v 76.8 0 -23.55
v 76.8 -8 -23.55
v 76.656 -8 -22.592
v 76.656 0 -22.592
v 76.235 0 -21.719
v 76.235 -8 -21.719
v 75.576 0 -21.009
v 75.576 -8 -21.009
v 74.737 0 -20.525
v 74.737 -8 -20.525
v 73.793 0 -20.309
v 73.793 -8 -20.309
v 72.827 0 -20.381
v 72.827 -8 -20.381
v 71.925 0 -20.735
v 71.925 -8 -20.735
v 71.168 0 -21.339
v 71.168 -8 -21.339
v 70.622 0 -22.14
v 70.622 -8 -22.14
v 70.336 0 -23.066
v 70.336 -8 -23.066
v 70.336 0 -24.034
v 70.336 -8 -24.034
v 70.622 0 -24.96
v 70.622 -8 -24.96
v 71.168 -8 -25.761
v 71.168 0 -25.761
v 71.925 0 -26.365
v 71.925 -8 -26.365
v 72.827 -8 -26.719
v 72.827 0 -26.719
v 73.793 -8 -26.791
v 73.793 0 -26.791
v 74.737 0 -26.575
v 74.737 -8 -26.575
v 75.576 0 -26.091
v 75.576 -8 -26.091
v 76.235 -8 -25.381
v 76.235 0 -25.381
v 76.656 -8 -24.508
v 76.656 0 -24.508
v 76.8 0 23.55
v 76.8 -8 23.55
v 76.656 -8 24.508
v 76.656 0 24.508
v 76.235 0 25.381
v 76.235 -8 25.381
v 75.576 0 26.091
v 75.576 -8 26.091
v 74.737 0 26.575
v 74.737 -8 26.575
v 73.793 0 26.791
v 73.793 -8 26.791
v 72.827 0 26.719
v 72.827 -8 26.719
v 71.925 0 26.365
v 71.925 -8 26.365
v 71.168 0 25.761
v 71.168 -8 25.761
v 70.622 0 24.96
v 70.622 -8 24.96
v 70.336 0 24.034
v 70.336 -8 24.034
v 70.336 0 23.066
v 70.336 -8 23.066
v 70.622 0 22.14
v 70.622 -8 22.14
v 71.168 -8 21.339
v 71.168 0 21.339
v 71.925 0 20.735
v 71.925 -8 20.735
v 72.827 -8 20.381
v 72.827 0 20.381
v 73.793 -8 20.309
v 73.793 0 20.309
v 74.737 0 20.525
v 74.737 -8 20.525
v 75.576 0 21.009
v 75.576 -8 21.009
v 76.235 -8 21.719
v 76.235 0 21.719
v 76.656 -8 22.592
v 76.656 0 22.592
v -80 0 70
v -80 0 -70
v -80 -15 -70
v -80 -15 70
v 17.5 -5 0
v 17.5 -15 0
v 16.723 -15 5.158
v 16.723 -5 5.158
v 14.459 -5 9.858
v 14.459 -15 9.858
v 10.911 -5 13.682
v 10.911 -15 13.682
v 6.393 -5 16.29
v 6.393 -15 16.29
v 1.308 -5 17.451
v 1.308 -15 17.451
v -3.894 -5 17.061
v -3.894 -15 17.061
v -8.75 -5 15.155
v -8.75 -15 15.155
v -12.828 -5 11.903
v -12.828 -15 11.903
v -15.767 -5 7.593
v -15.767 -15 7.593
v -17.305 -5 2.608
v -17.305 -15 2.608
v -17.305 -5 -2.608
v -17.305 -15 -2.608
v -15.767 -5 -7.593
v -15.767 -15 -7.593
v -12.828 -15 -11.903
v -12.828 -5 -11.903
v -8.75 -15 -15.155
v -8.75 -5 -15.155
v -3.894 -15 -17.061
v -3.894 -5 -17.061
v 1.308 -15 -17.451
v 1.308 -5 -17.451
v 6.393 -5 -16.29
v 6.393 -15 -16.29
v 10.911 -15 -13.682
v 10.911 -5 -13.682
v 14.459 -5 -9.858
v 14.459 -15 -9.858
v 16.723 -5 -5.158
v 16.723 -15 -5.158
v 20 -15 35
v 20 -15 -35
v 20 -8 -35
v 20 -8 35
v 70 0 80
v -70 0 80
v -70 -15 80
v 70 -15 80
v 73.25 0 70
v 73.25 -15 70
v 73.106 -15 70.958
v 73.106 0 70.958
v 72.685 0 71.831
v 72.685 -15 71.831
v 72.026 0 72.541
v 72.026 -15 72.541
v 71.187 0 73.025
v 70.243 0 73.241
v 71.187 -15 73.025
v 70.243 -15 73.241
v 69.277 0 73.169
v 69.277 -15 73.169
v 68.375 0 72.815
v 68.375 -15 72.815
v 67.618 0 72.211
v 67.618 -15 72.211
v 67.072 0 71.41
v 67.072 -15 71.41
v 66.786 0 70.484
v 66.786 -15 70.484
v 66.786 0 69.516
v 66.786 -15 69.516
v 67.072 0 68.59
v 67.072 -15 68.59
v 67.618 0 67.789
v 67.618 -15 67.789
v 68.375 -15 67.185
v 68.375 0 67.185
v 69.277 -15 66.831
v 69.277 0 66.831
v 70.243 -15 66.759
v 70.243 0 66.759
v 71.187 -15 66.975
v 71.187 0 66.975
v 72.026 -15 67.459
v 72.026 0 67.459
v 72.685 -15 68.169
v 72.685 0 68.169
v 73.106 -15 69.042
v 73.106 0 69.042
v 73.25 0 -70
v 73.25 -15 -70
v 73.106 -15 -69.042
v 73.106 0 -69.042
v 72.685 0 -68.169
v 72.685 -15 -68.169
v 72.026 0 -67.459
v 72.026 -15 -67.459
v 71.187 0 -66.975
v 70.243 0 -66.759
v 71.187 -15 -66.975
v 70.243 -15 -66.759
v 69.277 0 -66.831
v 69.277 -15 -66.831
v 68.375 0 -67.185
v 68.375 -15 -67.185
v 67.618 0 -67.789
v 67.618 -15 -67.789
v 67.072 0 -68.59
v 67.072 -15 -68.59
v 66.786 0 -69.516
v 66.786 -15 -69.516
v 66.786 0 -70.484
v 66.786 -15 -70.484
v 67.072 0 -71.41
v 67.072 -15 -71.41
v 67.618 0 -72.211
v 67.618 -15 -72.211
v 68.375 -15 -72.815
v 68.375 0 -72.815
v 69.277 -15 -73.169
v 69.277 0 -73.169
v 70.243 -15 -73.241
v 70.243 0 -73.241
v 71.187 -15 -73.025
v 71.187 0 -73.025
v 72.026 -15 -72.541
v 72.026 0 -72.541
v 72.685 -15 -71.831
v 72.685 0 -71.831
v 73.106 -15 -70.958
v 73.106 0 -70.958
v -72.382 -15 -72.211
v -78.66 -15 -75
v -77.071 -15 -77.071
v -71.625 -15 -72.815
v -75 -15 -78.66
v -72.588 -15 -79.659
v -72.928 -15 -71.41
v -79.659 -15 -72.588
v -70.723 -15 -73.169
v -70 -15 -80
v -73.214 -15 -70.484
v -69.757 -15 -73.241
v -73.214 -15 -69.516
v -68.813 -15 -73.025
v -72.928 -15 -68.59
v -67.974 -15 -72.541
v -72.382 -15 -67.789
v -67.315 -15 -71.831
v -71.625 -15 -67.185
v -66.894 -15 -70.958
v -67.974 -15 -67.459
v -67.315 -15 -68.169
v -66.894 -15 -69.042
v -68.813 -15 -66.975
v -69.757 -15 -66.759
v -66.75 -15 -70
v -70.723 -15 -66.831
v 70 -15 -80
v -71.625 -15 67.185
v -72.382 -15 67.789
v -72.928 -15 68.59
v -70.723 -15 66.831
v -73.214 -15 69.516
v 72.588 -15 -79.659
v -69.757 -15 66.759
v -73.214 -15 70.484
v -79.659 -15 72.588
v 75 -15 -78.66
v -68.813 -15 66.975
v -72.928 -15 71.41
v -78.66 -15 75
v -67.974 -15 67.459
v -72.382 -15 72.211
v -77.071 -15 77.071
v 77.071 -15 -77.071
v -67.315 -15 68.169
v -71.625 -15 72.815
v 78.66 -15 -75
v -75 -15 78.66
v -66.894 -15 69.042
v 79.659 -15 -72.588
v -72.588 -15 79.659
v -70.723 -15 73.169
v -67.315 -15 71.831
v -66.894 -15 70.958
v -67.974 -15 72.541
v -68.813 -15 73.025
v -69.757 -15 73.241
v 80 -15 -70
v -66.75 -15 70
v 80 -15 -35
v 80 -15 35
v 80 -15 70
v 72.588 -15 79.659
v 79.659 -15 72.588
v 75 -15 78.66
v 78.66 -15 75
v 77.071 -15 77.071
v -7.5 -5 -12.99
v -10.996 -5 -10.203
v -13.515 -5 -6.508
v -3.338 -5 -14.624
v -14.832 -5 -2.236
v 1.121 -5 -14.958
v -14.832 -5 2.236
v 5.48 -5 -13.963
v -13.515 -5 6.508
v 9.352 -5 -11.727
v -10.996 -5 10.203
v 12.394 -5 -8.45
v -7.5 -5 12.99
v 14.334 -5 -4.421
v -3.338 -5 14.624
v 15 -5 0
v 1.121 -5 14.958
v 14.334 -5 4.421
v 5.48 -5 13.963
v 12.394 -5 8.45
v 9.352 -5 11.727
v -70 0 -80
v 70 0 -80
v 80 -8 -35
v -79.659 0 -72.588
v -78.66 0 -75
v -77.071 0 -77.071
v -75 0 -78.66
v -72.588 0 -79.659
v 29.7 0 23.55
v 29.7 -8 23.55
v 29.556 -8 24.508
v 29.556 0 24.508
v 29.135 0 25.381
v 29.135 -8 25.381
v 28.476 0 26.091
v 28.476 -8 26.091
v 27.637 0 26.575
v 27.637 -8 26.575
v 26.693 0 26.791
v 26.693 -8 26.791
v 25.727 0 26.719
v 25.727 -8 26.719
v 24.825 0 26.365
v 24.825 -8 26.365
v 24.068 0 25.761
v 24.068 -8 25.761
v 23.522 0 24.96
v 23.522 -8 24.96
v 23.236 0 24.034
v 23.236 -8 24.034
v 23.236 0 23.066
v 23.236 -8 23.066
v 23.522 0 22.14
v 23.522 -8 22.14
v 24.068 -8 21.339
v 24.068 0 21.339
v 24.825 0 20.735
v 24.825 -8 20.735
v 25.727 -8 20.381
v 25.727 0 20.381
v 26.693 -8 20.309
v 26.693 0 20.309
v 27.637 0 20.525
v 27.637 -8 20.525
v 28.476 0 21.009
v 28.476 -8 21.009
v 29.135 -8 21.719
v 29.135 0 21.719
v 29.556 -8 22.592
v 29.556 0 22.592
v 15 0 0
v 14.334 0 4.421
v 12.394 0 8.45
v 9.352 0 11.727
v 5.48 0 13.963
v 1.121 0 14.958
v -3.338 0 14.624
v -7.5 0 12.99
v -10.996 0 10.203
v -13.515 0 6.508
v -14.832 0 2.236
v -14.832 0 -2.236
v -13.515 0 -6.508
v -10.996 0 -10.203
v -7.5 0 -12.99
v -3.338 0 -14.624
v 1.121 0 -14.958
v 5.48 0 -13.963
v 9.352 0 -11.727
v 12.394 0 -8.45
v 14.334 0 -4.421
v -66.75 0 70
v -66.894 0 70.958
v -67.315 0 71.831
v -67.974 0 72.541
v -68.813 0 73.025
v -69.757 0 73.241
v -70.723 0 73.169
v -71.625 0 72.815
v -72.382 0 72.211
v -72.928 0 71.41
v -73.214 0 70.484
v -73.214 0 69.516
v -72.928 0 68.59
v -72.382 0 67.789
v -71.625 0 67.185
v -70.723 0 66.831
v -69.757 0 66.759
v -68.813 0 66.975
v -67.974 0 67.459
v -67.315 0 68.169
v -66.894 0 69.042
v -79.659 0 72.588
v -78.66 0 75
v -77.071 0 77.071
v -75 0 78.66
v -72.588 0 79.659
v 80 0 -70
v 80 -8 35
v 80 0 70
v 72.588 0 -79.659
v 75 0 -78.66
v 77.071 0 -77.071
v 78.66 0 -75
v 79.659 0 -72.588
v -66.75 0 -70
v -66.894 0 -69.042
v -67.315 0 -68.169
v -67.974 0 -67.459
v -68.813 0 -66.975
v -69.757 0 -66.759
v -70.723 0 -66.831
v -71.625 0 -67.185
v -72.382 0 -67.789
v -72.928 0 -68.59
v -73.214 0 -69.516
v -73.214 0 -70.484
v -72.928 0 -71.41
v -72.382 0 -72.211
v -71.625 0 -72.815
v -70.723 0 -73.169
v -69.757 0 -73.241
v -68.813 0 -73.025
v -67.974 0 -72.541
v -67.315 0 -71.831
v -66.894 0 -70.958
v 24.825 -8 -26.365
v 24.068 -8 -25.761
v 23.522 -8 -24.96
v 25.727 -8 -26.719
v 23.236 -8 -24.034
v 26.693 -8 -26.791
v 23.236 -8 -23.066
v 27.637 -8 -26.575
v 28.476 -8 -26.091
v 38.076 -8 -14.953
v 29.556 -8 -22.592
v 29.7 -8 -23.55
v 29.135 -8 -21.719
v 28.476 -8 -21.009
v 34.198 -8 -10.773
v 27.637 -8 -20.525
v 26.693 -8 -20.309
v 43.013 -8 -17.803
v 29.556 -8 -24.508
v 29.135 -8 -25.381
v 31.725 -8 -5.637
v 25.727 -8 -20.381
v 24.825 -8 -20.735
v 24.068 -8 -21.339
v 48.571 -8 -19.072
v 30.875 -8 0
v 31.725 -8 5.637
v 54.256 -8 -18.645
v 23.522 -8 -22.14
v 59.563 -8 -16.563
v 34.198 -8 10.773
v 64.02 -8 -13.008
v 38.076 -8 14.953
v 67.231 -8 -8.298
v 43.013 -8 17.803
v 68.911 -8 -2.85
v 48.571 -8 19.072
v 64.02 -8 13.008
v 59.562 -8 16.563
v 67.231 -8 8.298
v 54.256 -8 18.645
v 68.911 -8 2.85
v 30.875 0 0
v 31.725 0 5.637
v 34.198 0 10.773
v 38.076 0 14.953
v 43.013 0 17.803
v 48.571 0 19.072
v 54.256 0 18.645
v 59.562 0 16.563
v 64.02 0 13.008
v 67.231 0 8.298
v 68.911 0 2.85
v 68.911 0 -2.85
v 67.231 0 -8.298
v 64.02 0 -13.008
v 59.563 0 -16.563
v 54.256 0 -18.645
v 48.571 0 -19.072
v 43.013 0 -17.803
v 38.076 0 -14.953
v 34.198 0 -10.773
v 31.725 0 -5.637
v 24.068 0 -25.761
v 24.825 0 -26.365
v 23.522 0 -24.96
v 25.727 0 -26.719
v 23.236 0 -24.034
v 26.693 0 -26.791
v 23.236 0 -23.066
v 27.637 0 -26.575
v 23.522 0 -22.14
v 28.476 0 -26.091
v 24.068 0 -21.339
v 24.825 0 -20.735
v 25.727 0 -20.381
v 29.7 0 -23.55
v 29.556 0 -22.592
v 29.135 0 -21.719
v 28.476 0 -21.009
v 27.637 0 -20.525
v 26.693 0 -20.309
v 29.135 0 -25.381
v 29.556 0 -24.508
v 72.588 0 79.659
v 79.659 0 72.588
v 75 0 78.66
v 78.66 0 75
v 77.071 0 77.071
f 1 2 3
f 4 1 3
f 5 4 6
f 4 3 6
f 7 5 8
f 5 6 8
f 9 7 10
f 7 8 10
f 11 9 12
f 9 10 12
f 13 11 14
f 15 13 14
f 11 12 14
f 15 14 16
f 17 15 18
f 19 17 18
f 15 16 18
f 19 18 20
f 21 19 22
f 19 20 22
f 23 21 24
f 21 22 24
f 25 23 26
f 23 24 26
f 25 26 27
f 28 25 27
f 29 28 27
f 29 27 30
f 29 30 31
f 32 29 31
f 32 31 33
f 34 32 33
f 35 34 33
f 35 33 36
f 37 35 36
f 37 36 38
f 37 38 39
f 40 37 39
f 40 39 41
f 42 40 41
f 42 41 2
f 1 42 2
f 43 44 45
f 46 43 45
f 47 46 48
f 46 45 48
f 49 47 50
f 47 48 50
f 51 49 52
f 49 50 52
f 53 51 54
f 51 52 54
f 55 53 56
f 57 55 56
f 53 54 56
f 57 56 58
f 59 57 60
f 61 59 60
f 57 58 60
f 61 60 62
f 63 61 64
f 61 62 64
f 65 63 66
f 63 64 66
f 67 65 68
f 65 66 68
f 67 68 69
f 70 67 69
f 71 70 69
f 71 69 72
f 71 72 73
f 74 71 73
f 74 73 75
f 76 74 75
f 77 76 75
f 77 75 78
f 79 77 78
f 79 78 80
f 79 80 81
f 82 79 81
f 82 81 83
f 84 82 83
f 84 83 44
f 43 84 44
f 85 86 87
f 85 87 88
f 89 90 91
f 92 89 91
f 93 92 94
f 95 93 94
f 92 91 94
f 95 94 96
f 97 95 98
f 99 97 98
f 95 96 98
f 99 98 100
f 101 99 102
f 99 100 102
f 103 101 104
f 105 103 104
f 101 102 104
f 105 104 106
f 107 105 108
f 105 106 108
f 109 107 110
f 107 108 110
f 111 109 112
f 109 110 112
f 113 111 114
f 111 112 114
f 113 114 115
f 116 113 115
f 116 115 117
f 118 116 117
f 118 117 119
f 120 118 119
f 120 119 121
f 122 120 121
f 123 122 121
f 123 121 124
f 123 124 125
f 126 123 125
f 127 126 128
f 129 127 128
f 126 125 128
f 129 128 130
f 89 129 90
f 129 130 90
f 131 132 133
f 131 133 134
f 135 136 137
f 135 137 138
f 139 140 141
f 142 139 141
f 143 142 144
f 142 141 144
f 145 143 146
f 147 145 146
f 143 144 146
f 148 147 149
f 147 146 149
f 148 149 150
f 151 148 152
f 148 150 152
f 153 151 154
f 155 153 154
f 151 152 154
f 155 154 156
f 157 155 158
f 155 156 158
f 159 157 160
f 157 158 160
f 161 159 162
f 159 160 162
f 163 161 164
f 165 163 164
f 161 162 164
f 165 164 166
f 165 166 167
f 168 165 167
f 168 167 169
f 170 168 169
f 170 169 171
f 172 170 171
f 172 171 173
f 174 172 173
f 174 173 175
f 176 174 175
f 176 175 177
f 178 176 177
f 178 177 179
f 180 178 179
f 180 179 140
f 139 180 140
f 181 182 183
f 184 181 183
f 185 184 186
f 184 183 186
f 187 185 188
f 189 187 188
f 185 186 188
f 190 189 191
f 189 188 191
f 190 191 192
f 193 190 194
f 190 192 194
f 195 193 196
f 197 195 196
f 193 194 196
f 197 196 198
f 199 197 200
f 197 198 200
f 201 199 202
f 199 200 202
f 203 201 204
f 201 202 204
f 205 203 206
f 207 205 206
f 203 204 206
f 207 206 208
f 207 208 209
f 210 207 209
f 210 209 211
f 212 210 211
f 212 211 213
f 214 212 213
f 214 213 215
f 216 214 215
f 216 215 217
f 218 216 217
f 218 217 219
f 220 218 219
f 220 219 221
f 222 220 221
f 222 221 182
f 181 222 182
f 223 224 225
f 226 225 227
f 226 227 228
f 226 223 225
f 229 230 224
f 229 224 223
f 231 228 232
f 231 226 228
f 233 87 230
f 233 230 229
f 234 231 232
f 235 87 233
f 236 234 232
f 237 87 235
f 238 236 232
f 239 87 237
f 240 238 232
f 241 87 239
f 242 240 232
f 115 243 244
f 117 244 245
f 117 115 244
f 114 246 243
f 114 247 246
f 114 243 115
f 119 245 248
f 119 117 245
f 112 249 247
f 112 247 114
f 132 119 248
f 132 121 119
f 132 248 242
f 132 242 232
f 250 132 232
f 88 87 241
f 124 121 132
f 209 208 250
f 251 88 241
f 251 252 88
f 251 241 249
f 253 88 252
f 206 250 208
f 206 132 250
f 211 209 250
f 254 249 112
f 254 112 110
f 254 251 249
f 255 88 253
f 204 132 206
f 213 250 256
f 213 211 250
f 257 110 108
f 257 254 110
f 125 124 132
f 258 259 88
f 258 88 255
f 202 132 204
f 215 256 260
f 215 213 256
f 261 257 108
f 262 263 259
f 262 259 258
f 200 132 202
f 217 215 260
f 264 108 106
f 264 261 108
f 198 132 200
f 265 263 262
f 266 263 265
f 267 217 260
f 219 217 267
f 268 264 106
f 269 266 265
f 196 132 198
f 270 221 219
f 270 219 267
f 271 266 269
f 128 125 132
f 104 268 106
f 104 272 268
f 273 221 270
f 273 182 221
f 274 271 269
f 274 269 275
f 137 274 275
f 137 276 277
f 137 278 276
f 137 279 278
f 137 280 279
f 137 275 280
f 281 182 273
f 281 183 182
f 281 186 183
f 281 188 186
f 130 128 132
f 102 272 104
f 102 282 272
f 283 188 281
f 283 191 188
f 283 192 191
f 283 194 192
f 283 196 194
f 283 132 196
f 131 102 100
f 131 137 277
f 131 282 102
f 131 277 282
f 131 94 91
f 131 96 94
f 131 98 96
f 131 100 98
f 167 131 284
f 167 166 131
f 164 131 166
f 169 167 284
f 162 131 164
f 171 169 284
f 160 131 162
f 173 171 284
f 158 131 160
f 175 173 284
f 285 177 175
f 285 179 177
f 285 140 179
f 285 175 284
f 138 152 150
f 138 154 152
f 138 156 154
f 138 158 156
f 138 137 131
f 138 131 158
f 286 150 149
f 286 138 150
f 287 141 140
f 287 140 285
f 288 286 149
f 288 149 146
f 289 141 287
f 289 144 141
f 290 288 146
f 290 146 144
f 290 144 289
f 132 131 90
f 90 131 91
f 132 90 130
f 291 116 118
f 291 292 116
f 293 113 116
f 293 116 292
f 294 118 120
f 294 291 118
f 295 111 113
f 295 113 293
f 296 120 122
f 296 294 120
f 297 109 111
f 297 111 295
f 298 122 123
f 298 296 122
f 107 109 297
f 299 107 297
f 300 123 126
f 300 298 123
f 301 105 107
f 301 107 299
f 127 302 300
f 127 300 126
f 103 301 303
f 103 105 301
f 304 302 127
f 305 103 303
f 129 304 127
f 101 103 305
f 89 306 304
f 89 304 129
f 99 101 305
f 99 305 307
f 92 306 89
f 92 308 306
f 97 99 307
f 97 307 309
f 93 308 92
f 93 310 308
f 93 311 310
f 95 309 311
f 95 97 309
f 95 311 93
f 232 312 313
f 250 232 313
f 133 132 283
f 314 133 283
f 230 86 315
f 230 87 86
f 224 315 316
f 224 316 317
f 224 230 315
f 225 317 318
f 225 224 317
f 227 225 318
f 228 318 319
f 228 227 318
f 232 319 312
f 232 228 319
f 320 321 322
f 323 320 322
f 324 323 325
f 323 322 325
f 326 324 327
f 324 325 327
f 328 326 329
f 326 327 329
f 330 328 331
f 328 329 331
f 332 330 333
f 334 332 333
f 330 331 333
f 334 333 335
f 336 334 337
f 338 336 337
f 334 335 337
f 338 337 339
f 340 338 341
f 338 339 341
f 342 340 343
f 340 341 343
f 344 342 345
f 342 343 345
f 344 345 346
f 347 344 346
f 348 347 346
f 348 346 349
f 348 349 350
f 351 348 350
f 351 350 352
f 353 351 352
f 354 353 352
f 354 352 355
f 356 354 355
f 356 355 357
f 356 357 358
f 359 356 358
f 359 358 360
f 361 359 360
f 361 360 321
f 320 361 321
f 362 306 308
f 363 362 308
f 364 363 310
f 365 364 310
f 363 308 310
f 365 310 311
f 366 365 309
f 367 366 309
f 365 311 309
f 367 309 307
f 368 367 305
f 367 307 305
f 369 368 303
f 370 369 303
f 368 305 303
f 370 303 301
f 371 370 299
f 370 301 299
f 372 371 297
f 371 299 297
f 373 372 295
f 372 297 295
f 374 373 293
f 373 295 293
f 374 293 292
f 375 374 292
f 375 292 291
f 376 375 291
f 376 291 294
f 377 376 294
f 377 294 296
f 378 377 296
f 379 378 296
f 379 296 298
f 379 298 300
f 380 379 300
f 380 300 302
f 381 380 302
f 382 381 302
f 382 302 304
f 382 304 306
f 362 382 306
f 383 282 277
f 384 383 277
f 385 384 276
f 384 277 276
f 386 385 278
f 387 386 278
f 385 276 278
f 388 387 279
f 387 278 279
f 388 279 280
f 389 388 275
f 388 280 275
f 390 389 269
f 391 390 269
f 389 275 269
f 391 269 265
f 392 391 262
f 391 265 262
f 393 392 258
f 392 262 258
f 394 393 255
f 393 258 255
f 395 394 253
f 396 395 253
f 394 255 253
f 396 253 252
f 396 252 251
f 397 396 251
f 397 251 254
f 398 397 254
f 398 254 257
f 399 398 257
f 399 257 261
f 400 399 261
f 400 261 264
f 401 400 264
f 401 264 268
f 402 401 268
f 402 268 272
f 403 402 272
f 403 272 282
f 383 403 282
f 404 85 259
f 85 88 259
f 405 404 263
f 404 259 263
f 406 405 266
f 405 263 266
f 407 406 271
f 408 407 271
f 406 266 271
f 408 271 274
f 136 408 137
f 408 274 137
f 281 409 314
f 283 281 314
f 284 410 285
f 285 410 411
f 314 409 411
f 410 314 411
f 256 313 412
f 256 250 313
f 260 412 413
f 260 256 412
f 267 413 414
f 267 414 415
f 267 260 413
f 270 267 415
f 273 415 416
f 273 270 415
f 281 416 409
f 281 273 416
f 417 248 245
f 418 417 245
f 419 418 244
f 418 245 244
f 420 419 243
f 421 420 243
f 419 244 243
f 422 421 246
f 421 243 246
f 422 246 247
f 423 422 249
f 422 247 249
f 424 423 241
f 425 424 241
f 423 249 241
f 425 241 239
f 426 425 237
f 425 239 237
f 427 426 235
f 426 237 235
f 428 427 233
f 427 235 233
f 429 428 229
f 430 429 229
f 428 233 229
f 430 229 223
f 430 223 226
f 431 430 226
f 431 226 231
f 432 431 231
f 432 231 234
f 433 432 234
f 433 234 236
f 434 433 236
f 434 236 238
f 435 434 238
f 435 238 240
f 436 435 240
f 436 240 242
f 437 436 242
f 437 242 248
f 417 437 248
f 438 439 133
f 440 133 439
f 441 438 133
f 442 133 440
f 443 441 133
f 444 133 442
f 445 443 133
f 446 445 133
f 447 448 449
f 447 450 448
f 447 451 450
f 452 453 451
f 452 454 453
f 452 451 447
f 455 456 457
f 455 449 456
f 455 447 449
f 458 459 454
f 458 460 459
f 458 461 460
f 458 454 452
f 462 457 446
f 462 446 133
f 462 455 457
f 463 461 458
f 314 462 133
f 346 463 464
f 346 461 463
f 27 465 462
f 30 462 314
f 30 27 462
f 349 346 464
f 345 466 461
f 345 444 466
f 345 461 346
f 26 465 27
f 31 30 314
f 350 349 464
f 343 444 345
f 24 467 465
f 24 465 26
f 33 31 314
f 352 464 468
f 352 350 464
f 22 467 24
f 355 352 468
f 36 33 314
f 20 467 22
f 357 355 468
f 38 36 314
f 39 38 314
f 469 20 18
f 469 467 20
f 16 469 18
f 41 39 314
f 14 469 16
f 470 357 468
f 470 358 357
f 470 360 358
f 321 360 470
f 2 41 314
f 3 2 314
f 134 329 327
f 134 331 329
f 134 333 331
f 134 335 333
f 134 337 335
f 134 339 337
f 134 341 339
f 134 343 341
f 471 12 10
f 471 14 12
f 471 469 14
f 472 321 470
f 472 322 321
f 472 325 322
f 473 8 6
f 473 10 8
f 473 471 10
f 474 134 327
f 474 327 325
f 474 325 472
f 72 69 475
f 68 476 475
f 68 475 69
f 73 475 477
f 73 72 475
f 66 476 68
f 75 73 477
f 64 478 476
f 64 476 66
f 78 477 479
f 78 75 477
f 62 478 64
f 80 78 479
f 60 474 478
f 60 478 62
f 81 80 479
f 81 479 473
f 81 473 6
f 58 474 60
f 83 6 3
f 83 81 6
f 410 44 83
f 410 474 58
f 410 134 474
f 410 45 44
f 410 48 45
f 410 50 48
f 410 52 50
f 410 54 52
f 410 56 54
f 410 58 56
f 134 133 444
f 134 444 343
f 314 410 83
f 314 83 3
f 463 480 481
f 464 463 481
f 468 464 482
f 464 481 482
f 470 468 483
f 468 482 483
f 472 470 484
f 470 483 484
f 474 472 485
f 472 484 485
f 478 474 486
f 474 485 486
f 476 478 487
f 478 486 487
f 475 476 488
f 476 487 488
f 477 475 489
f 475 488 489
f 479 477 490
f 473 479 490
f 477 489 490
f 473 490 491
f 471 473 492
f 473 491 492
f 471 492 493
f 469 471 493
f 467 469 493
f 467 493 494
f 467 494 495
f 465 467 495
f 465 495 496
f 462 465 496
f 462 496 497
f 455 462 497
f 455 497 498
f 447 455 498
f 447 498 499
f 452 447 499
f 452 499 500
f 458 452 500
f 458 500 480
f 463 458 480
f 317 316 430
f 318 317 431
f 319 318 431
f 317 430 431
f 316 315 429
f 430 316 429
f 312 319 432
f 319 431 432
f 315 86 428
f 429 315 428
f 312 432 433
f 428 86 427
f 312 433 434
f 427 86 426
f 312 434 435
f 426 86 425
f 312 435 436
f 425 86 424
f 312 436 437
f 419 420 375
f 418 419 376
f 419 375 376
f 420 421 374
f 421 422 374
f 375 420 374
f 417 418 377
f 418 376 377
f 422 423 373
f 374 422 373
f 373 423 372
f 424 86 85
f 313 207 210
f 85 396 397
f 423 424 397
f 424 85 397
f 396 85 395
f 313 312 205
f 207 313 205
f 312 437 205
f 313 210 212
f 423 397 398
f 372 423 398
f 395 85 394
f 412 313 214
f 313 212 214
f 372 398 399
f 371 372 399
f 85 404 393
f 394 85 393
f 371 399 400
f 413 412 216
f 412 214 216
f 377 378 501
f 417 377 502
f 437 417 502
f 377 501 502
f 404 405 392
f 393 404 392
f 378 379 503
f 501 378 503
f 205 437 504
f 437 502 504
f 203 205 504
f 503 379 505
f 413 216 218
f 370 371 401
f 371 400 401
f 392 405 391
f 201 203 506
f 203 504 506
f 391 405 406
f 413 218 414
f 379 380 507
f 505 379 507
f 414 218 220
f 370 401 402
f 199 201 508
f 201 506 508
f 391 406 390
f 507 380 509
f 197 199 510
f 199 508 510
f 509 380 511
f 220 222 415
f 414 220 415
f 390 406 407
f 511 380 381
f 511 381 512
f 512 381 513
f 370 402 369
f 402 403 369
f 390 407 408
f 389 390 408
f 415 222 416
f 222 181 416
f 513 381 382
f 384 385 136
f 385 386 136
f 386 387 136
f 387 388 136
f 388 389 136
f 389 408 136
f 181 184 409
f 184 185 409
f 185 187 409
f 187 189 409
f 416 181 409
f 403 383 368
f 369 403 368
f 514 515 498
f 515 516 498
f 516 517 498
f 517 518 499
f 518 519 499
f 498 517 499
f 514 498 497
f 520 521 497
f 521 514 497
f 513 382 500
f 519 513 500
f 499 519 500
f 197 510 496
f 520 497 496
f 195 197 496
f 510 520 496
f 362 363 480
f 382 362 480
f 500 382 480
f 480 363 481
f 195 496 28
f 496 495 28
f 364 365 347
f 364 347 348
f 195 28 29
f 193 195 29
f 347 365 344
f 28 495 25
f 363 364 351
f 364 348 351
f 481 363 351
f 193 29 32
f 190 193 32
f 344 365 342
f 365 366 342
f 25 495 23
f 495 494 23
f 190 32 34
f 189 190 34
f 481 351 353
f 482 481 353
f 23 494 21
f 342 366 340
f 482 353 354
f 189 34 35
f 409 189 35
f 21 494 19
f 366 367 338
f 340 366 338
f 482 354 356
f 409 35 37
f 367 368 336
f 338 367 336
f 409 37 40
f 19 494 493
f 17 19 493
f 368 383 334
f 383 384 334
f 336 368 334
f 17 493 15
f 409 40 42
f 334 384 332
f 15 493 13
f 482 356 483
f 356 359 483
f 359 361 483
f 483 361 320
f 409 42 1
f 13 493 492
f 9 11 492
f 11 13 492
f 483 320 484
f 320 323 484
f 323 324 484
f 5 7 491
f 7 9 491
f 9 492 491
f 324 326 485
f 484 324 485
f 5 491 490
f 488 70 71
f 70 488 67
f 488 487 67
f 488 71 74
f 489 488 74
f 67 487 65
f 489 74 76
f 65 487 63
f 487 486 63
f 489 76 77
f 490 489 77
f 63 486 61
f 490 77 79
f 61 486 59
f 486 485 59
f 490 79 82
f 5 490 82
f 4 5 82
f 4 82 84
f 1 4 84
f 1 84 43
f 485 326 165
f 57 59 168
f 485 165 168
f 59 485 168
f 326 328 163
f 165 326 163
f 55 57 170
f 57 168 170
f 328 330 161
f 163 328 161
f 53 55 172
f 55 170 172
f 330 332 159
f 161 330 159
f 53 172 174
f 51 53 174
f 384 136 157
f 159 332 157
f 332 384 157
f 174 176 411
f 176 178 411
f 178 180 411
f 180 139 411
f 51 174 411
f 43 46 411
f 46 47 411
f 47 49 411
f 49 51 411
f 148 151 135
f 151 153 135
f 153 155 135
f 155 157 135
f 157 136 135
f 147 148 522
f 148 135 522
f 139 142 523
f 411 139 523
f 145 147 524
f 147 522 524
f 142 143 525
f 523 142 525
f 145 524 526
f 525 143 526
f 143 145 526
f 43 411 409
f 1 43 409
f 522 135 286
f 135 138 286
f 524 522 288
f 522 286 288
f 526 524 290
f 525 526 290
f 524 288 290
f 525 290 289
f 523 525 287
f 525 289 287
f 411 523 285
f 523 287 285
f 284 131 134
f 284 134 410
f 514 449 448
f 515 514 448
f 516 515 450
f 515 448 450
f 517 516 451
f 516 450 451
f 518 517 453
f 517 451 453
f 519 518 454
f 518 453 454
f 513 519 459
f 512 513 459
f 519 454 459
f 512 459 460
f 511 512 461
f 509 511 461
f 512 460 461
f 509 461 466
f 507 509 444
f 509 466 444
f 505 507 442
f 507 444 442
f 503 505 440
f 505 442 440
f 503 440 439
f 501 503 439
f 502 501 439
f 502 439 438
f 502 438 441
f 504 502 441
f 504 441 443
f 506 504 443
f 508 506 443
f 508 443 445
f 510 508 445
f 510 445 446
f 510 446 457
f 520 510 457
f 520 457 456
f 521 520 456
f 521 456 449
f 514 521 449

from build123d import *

# Parameters (mm, degrees)
F0_W      = 160
F0_H      = 160
F1_DEPTH  = 15
F2_R      = 15
F3_DEPTH  = 25
F4_R      = 17.5
F5_DEPTH  = 10
F6_R      = 10
F7_W      = 60
F7_H      = 70
F8_DEPTH  = 7
F9_R      = 19.125
F10_DEPTH = 25
F11_R     = 3.25
F12_DEPTH = 25
F13_R     = 3.25
F14_DEPTH = 25


with BuildPart() as f1:
    # F0 (on Front) → F1 (new body)
    with BuildSketch(Plane.XZ):
        Rectangle(F0_W, F0_H)
    extrude(amount=F1_DEPTH)

    # F2 (on face) → F3 (cut)
    with BuildSketch(Plane.XZ.offset(15)):
        Circle(F2_R)
    extrude(amount=-F3_DEPTH, mode=Mode.SUBTRACT)

    # F4 (on face) → F5 (cut)
    with BuildSketch(Plane.XZ.offset(15)):
        Circle(F4_R)
    extrude(amount=-F5_DEPTH, mode=Mode.SUBTRACT)

    # F6
    f6_edges = [f1.edges().sort_by_distance(p)[0] for p in [
        (80, -7.5, 80),
        (80, -7.5, -80),
        (-80, -7.5, -80),
        (-80, -7.5, 80),
    ]]
    fillet(f6_edges, radius=F6_R)

    # F7 (on face) → F8 (cut)
    with BuildSketch(Plane.XZ.offset(15)):
        with Locations((50, 0)):
            Rectangle(F7_W, F7_H)
    extrude(amount=-F8_DEPTH, mode=Mode.SUBTRACT)

    # F9 (on face) → F10 (cut)
    with BuildSketch(Plane(origin=(0, 0, 0), x_dir=(-1, 0, 0), z_dir=(0, 1, 0))):
        with Locations((-50, 0)):
            Circle(F9_R)
    extrude(amount=-F10_DEPTH, mode=Mode.SUBTRACT)

    # F11 (on face) → F12 (cut)
    with BuildSketch(Plane.XZ.offset(8)):
        with Locations((26.45, 23.55)):
            Circle(F11_R)
        with Locations((26.45, -23.55)):
            Circle(F11_R)
        with Locations((73.55, -23.55)):
            Circle(F11_R)
        with Locations((73.55, 23.55)):
            Circle(F11_R)
    extrude(amount=-F12_DEPTH, mode=Mode.SUBTRACT)

    # F13 (on face) → F14 (cut)
    with BuildSketch(Plane.XZ.offset(15)):
        with Locations((70, 70)):
            Circle(F13_R)
        with Locations((-70, 70)):
            Circle(F13_R)
        with Locations((-70, -70)):
            Circle(F13_R)
        with Locations((70, -70)):
            Circle(F13_R)
    extrude(amount=-F14_DEPTH, mode=Mode.SUBTRACT)


solid = f1.part
